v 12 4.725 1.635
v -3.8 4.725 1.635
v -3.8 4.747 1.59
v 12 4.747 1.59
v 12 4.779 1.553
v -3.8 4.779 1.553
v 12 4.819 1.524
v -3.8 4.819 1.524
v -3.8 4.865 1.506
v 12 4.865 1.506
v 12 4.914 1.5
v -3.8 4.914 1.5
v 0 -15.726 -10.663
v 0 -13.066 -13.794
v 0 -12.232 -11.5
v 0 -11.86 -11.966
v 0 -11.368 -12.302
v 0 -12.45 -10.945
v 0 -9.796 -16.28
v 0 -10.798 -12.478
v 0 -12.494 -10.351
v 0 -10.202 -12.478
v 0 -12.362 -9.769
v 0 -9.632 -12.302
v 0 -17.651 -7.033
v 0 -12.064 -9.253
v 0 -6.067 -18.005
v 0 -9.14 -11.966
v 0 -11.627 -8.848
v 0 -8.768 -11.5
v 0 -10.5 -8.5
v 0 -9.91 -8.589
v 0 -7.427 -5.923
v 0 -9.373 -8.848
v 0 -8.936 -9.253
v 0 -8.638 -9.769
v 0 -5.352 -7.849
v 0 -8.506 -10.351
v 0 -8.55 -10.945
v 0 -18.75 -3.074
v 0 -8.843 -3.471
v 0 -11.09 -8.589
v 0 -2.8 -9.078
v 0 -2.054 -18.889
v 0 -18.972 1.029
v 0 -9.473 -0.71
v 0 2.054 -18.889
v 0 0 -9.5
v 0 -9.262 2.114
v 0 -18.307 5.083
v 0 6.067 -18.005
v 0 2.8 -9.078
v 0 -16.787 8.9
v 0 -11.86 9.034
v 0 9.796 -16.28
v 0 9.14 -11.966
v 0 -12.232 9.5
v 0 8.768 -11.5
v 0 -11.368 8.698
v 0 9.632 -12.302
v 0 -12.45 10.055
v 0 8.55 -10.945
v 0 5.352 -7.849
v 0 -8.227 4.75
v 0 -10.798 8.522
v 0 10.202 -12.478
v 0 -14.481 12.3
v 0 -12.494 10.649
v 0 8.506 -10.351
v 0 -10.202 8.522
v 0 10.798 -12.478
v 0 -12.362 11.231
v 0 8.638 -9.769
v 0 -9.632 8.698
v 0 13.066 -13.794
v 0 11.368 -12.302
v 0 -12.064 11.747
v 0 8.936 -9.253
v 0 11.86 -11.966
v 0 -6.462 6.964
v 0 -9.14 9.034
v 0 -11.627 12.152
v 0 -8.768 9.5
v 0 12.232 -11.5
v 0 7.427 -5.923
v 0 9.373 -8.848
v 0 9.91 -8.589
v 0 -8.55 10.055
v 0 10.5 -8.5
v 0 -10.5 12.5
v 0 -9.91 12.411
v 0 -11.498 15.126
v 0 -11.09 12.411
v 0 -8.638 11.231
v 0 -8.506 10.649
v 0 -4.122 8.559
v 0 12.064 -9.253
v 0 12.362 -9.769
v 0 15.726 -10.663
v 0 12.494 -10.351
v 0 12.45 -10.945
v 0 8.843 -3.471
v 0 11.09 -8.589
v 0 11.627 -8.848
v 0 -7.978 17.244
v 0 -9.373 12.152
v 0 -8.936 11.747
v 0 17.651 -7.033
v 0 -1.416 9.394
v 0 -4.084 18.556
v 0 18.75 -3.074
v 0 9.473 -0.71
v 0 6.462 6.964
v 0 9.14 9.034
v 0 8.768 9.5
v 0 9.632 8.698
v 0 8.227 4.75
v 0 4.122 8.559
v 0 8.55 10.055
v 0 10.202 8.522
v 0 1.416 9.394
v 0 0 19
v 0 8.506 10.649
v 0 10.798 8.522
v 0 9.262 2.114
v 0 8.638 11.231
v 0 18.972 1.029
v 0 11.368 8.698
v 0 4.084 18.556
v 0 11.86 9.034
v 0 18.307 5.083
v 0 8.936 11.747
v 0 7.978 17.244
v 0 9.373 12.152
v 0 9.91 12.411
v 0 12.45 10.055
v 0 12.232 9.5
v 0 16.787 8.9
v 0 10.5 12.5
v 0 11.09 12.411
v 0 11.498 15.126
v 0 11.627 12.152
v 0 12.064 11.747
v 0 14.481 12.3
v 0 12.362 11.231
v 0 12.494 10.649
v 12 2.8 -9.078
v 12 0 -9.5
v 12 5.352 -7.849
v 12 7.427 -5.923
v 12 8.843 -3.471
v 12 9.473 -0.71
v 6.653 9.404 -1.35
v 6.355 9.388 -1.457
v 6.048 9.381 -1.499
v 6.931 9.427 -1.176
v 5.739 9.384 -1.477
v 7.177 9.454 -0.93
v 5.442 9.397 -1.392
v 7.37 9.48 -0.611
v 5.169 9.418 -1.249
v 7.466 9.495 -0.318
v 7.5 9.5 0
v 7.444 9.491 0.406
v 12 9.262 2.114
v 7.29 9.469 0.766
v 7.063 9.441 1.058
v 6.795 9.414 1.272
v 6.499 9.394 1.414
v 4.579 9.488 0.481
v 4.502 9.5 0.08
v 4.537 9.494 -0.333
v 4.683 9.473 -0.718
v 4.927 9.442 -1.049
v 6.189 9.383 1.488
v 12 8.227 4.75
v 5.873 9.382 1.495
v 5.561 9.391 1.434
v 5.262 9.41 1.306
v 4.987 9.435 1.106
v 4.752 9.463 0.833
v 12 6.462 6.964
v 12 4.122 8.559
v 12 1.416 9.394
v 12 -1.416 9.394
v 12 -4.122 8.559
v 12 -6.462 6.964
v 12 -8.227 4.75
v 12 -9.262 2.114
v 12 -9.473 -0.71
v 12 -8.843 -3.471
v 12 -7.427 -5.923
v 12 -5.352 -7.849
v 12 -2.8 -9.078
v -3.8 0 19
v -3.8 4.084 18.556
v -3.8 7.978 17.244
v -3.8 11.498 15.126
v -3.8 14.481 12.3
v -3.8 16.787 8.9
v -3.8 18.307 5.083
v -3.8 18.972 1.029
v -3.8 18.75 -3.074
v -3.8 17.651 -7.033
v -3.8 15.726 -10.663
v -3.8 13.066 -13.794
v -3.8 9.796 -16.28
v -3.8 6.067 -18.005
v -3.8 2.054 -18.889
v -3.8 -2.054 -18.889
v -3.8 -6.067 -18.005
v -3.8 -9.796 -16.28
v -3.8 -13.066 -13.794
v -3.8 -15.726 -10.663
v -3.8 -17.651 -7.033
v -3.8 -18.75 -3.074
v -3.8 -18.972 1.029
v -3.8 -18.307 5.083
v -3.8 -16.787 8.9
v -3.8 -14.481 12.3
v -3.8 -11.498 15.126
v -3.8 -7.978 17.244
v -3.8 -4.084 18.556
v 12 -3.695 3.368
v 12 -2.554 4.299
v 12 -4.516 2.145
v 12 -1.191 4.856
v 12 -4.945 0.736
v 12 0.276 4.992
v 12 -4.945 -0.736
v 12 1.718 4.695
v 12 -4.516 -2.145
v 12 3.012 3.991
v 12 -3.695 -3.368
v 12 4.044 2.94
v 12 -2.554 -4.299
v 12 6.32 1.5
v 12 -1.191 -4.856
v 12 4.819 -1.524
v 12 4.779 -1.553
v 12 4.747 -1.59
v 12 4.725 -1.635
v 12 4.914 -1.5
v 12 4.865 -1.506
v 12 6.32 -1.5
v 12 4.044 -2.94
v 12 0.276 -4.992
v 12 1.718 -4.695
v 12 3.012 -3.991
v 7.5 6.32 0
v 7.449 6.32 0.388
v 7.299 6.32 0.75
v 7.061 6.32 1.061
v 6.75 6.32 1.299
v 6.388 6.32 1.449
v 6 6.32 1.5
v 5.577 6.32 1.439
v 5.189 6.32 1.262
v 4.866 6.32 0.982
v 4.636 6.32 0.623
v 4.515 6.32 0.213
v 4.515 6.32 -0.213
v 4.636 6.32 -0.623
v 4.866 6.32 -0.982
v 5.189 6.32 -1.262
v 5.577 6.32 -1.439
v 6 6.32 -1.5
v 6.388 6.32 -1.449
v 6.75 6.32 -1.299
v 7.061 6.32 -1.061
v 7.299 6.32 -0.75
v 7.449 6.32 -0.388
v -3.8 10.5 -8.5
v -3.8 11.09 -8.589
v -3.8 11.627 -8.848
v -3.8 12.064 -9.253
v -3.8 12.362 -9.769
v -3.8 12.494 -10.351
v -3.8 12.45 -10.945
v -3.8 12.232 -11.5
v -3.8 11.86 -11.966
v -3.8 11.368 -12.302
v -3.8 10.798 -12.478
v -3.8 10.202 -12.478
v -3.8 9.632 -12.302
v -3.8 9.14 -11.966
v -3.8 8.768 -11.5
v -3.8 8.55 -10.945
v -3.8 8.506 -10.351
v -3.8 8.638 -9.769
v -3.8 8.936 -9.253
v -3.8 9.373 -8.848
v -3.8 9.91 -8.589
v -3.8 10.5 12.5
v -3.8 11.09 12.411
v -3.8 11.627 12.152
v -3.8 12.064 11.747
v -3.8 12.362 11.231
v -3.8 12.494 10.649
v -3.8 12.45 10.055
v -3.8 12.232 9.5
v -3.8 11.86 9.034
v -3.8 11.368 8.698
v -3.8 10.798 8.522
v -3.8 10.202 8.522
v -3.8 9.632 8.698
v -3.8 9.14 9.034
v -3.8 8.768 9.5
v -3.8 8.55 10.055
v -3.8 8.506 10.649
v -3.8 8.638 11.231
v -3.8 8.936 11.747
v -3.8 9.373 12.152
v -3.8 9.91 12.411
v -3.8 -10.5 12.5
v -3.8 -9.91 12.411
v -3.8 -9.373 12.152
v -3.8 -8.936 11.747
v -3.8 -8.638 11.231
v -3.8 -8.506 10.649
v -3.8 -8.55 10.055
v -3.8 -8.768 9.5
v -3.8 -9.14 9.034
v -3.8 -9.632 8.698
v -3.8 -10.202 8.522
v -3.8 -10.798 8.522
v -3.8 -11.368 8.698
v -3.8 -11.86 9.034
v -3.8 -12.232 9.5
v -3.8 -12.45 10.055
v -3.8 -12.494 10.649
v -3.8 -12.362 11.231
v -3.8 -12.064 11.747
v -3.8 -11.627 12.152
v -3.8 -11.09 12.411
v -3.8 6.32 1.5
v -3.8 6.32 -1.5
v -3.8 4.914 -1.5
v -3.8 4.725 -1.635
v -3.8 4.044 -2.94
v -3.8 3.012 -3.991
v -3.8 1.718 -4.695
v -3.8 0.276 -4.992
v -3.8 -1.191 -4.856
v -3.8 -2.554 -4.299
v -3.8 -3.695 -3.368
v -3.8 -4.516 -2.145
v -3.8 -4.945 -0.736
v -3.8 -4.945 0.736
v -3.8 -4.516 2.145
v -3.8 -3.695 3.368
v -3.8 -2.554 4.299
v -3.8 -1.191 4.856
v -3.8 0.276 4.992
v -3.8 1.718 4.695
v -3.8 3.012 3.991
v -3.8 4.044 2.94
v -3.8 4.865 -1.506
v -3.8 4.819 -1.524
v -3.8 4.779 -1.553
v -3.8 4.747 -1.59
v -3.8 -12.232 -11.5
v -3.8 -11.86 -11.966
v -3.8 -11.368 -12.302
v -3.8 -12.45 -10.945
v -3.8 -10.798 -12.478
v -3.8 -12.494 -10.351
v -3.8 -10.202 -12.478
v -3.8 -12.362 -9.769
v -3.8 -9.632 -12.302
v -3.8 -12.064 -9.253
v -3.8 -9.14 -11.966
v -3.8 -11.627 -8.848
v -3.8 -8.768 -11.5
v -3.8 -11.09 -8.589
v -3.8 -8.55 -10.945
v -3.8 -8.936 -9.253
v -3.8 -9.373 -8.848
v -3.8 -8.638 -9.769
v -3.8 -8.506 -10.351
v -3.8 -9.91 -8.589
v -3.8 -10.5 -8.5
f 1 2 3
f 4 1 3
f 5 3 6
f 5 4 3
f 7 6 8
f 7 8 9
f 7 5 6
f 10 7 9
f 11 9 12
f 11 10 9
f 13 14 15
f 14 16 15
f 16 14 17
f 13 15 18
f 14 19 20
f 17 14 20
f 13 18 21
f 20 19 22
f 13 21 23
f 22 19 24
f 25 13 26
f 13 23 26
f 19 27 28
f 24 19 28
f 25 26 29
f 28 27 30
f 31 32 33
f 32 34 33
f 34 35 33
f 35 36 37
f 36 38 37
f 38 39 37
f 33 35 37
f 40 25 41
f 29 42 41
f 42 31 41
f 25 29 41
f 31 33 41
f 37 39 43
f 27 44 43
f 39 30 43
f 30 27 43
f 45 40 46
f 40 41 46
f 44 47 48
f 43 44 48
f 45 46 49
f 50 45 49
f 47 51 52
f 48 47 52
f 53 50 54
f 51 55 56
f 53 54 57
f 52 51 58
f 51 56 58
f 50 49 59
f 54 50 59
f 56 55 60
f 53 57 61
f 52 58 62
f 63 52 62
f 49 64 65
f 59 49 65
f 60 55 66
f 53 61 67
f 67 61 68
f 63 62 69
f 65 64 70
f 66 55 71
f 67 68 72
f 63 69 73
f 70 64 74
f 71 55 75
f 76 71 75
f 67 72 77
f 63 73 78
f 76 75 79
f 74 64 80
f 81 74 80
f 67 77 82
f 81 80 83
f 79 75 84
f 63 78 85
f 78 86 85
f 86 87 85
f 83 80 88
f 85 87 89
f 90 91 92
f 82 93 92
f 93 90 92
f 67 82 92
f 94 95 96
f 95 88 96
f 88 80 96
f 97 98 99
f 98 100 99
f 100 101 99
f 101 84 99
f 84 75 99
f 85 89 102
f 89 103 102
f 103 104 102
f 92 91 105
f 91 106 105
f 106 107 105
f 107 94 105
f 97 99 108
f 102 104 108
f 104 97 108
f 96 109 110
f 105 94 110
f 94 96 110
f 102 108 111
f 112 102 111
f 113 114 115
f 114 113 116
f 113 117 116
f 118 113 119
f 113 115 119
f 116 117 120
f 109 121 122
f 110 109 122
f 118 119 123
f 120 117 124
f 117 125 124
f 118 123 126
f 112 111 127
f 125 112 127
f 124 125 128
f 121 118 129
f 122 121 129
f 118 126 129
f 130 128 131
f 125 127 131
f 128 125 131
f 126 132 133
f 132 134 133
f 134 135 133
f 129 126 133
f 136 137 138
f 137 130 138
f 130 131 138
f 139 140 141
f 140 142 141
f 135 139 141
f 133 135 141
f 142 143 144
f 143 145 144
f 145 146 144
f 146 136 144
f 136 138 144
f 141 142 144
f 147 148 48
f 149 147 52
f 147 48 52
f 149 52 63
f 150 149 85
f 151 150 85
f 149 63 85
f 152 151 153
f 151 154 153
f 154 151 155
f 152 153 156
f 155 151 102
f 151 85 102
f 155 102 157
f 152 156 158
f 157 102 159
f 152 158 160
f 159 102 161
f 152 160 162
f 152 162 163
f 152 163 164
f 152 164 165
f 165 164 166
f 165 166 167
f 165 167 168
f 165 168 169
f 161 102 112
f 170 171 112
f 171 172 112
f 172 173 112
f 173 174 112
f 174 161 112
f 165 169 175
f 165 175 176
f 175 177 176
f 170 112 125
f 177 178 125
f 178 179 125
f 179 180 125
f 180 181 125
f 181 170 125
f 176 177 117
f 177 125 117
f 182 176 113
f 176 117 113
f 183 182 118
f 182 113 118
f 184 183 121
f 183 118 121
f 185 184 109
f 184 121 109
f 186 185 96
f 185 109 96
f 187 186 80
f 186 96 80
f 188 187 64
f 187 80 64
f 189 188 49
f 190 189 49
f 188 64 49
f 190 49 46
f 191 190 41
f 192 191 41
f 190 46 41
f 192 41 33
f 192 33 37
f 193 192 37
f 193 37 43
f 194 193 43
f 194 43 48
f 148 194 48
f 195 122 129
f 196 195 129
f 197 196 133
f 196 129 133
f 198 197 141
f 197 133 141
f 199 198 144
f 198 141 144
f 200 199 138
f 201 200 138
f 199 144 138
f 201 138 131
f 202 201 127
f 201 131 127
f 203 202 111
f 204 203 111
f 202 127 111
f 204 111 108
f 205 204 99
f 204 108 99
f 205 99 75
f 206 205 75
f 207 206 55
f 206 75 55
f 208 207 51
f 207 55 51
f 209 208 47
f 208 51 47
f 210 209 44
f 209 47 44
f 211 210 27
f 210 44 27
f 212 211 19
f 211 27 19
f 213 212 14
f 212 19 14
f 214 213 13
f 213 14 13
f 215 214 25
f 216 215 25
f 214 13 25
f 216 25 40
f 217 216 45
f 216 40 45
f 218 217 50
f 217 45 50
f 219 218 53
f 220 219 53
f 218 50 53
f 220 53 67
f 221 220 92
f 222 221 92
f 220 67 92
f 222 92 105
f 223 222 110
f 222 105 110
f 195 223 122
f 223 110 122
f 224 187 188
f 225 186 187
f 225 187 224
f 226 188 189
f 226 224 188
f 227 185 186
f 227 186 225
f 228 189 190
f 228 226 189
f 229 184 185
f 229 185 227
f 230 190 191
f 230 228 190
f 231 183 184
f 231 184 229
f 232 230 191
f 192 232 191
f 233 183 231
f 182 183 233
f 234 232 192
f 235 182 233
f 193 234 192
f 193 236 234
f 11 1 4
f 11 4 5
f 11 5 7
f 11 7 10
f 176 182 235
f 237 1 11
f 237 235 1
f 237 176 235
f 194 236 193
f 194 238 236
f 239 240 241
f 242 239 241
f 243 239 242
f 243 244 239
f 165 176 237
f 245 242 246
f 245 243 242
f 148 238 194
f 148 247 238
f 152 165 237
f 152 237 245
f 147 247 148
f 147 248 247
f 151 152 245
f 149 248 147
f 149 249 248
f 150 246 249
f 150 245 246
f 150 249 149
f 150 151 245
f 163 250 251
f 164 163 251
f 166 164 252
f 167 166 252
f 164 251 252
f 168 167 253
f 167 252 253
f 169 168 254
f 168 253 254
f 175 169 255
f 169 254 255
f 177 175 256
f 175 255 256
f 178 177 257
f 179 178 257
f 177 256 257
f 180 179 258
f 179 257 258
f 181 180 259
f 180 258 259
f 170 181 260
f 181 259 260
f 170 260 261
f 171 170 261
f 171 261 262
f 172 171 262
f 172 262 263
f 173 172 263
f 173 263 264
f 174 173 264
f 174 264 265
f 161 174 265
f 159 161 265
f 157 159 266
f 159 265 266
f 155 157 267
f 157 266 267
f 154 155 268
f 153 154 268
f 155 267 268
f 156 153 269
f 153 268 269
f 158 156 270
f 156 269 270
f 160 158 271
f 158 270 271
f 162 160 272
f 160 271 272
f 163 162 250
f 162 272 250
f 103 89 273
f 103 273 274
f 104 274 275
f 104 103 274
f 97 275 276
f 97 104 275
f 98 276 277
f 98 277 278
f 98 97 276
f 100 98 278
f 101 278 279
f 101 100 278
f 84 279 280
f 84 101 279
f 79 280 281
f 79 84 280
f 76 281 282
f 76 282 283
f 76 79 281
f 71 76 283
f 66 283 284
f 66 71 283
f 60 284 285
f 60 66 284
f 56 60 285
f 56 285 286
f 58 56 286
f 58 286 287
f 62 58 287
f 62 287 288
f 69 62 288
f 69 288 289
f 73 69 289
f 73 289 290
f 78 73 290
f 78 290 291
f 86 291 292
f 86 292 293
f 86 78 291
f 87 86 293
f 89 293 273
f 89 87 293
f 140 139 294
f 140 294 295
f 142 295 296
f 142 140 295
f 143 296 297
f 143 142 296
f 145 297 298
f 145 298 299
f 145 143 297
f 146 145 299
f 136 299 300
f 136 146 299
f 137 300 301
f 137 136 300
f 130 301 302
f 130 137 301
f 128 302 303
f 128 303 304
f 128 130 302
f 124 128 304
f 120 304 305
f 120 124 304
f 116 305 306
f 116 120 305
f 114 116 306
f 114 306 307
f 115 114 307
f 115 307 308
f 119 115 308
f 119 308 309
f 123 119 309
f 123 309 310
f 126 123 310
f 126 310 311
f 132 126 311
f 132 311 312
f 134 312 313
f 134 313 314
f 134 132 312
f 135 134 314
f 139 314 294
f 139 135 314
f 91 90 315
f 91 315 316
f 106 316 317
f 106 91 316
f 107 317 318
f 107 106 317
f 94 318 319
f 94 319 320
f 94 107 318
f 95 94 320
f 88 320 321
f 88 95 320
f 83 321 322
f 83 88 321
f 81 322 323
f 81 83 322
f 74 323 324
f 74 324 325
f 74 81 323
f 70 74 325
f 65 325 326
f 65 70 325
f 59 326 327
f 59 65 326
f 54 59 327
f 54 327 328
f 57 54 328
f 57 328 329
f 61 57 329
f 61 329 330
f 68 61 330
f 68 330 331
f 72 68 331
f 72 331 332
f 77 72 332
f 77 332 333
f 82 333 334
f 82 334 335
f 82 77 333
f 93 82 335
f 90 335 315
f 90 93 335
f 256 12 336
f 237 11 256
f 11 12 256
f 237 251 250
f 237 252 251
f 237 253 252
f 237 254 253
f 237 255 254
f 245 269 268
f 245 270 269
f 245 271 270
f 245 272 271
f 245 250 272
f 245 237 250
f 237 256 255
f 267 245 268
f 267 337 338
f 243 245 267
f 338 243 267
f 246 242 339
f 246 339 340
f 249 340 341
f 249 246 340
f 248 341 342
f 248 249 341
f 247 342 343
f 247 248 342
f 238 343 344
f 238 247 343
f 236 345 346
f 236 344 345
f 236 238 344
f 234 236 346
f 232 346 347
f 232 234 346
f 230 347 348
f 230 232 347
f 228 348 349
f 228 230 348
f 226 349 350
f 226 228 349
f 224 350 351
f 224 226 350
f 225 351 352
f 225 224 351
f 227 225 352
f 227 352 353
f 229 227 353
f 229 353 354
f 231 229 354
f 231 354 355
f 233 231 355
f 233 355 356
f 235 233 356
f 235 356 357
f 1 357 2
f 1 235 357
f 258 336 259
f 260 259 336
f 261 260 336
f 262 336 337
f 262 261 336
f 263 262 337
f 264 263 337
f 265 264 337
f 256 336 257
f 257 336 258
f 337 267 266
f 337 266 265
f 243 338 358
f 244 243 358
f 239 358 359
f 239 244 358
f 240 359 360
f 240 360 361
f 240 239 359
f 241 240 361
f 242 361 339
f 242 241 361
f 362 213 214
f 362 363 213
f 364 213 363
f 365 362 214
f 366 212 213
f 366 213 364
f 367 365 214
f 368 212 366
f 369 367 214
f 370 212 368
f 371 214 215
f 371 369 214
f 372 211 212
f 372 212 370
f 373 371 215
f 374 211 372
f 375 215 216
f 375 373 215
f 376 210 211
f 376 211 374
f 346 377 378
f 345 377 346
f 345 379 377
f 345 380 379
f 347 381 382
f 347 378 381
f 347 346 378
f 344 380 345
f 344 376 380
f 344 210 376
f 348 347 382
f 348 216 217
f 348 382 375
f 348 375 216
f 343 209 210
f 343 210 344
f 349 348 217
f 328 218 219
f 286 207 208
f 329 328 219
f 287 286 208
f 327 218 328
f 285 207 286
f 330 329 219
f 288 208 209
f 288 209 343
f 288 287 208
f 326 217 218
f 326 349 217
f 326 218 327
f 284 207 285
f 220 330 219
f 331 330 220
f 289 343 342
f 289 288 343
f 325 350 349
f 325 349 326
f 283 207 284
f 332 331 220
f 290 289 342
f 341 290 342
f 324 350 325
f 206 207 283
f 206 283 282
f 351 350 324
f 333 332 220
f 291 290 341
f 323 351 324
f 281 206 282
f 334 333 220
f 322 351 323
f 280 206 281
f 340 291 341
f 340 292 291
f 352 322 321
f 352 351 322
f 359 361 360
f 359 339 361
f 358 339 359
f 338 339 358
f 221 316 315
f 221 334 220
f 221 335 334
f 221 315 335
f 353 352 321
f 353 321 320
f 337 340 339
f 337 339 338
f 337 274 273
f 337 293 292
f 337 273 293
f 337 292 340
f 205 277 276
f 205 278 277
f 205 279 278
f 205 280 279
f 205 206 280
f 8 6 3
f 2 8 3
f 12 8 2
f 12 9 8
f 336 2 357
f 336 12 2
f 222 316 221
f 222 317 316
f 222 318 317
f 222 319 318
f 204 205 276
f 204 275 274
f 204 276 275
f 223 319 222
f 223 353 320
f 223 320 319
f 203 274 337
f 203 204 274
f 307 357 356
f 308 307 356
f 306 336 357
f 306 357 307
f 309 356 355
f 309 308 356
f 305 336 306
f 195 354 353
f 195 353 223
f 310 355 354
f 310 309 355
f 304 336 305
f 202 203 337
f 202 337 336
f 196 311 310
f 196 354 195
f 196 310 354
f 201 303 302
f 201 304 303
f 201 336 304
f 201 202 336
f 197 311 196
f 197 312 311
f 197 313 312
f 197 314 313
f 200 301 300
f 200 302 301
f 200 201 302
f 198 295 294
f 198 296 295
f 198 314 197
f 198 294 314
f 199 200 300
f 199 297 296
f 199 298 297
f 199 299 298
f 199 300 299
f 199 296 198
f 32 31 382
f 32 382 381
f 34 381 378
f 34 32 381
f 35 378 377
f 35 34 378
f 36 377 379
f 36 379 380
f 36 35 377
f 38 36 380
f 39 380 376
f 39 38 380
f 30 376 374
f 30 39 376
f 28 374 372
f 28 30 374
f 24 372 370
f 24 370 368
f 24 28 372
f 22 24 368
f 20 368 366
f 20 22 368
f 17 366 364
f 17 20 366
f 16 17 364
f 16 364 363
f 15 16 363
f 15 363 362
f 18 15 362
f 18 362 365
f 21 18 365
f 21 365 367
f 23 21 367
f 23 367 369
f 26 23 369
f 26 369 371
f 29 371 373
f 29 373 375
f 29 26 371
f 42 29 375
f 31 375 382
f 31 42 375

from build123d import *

# Parameters (mm, degrees)
SKETCH1_R           = 9.5
BOSS_EXTRUDE1_DEPTH = 12
SKETCH4_R           = 19
SKETCH4_R_2         = 2
BOSS_EXTRUDE3_DEPTH = 3.8
CUT_EXTRUDE2_DEPTH  = 20
SKETCH5_R           = 1.5
CUT_EXTRUDE3_DEPTH  = 5


with BuildPart() as part:
    # Sketch1 → Boss-Extrude1 (new body)
    with BuildSketch(Plane(origin=(0, 0, 0), x_dir=(0, 0, -1), z_dir=(1, 0, 0))):
        Circle(SKETCH1_R)
    extrude(amount=BOSS_EXTRUDE1_DEPTH)

    # Sketch4 → Boss-Extrude3 (add)
    with BuildSketch(Plane.ZY):
        Circle(SKETCH4_R)
        with Locations((-10.5, 10.5)):
            Circle(SKETCH4_R_2, mode=Mode.SUBTRACT)
        with Locations((10.5, 10.5)):
            Circle(SKETCH4_R_2, mode=Mode.SUBTRACT)
        with Locations((10.5, -10.5)):
            Circle(SKETCH4_R_2, mode=Mode.SUBTRACT)
        with Locations((-10.5, -10.5)):
            Circle(SKETCH4_R_2, mode=Mode.SUBTRACT)
    extrude(amount=BOSS_EXTRUDE3_DEPTH)

    # Sketch2 → Cut-Extrude2 (cut)
    with BuildSketch(Plane(origin=(12, 0, 0), x_dir=(0, 0, -1), z_dir=(1, 0, 0))):
        with BuildLine():
            Line((-1.5, 6.319696007), (1.5, 6.319696007))
            Line((1.5, 6.319696007), (1.5, 4.91426495))
            ThreePointArc((1.5, 4.91426495), (1.537093703, 4.79824108), (1.634615385, 4.72525476))
            ThreePointArc((1.634615385, 4.72525476), (0, -5), (-1.634615385, 4.72525476))
            ThreePointArc((-1.634615385, 4.72525476), (-1.537093703, 4.79824108), (-1.5, 4.91426495))
            Line((-1.5, 4.91426495), (-1.5, 6.319696007))
        make_face()
    extrude(amount=-CUT_EXTRUDE2_DEPTH, mode=Mode.SUBTRACT)

    # Sketch5 → Cut-Extrude3 (cut)
    with BuildSketch(Plane.XZ.offset(-6.319696007)):
        with Locations((6, 0)):
            Circle(SKETCH5_R)
    extrude(amount=-CUT_EXTRUDE3_DEPTH, mode=Mode.SUBTRACT)


solid = part.part
